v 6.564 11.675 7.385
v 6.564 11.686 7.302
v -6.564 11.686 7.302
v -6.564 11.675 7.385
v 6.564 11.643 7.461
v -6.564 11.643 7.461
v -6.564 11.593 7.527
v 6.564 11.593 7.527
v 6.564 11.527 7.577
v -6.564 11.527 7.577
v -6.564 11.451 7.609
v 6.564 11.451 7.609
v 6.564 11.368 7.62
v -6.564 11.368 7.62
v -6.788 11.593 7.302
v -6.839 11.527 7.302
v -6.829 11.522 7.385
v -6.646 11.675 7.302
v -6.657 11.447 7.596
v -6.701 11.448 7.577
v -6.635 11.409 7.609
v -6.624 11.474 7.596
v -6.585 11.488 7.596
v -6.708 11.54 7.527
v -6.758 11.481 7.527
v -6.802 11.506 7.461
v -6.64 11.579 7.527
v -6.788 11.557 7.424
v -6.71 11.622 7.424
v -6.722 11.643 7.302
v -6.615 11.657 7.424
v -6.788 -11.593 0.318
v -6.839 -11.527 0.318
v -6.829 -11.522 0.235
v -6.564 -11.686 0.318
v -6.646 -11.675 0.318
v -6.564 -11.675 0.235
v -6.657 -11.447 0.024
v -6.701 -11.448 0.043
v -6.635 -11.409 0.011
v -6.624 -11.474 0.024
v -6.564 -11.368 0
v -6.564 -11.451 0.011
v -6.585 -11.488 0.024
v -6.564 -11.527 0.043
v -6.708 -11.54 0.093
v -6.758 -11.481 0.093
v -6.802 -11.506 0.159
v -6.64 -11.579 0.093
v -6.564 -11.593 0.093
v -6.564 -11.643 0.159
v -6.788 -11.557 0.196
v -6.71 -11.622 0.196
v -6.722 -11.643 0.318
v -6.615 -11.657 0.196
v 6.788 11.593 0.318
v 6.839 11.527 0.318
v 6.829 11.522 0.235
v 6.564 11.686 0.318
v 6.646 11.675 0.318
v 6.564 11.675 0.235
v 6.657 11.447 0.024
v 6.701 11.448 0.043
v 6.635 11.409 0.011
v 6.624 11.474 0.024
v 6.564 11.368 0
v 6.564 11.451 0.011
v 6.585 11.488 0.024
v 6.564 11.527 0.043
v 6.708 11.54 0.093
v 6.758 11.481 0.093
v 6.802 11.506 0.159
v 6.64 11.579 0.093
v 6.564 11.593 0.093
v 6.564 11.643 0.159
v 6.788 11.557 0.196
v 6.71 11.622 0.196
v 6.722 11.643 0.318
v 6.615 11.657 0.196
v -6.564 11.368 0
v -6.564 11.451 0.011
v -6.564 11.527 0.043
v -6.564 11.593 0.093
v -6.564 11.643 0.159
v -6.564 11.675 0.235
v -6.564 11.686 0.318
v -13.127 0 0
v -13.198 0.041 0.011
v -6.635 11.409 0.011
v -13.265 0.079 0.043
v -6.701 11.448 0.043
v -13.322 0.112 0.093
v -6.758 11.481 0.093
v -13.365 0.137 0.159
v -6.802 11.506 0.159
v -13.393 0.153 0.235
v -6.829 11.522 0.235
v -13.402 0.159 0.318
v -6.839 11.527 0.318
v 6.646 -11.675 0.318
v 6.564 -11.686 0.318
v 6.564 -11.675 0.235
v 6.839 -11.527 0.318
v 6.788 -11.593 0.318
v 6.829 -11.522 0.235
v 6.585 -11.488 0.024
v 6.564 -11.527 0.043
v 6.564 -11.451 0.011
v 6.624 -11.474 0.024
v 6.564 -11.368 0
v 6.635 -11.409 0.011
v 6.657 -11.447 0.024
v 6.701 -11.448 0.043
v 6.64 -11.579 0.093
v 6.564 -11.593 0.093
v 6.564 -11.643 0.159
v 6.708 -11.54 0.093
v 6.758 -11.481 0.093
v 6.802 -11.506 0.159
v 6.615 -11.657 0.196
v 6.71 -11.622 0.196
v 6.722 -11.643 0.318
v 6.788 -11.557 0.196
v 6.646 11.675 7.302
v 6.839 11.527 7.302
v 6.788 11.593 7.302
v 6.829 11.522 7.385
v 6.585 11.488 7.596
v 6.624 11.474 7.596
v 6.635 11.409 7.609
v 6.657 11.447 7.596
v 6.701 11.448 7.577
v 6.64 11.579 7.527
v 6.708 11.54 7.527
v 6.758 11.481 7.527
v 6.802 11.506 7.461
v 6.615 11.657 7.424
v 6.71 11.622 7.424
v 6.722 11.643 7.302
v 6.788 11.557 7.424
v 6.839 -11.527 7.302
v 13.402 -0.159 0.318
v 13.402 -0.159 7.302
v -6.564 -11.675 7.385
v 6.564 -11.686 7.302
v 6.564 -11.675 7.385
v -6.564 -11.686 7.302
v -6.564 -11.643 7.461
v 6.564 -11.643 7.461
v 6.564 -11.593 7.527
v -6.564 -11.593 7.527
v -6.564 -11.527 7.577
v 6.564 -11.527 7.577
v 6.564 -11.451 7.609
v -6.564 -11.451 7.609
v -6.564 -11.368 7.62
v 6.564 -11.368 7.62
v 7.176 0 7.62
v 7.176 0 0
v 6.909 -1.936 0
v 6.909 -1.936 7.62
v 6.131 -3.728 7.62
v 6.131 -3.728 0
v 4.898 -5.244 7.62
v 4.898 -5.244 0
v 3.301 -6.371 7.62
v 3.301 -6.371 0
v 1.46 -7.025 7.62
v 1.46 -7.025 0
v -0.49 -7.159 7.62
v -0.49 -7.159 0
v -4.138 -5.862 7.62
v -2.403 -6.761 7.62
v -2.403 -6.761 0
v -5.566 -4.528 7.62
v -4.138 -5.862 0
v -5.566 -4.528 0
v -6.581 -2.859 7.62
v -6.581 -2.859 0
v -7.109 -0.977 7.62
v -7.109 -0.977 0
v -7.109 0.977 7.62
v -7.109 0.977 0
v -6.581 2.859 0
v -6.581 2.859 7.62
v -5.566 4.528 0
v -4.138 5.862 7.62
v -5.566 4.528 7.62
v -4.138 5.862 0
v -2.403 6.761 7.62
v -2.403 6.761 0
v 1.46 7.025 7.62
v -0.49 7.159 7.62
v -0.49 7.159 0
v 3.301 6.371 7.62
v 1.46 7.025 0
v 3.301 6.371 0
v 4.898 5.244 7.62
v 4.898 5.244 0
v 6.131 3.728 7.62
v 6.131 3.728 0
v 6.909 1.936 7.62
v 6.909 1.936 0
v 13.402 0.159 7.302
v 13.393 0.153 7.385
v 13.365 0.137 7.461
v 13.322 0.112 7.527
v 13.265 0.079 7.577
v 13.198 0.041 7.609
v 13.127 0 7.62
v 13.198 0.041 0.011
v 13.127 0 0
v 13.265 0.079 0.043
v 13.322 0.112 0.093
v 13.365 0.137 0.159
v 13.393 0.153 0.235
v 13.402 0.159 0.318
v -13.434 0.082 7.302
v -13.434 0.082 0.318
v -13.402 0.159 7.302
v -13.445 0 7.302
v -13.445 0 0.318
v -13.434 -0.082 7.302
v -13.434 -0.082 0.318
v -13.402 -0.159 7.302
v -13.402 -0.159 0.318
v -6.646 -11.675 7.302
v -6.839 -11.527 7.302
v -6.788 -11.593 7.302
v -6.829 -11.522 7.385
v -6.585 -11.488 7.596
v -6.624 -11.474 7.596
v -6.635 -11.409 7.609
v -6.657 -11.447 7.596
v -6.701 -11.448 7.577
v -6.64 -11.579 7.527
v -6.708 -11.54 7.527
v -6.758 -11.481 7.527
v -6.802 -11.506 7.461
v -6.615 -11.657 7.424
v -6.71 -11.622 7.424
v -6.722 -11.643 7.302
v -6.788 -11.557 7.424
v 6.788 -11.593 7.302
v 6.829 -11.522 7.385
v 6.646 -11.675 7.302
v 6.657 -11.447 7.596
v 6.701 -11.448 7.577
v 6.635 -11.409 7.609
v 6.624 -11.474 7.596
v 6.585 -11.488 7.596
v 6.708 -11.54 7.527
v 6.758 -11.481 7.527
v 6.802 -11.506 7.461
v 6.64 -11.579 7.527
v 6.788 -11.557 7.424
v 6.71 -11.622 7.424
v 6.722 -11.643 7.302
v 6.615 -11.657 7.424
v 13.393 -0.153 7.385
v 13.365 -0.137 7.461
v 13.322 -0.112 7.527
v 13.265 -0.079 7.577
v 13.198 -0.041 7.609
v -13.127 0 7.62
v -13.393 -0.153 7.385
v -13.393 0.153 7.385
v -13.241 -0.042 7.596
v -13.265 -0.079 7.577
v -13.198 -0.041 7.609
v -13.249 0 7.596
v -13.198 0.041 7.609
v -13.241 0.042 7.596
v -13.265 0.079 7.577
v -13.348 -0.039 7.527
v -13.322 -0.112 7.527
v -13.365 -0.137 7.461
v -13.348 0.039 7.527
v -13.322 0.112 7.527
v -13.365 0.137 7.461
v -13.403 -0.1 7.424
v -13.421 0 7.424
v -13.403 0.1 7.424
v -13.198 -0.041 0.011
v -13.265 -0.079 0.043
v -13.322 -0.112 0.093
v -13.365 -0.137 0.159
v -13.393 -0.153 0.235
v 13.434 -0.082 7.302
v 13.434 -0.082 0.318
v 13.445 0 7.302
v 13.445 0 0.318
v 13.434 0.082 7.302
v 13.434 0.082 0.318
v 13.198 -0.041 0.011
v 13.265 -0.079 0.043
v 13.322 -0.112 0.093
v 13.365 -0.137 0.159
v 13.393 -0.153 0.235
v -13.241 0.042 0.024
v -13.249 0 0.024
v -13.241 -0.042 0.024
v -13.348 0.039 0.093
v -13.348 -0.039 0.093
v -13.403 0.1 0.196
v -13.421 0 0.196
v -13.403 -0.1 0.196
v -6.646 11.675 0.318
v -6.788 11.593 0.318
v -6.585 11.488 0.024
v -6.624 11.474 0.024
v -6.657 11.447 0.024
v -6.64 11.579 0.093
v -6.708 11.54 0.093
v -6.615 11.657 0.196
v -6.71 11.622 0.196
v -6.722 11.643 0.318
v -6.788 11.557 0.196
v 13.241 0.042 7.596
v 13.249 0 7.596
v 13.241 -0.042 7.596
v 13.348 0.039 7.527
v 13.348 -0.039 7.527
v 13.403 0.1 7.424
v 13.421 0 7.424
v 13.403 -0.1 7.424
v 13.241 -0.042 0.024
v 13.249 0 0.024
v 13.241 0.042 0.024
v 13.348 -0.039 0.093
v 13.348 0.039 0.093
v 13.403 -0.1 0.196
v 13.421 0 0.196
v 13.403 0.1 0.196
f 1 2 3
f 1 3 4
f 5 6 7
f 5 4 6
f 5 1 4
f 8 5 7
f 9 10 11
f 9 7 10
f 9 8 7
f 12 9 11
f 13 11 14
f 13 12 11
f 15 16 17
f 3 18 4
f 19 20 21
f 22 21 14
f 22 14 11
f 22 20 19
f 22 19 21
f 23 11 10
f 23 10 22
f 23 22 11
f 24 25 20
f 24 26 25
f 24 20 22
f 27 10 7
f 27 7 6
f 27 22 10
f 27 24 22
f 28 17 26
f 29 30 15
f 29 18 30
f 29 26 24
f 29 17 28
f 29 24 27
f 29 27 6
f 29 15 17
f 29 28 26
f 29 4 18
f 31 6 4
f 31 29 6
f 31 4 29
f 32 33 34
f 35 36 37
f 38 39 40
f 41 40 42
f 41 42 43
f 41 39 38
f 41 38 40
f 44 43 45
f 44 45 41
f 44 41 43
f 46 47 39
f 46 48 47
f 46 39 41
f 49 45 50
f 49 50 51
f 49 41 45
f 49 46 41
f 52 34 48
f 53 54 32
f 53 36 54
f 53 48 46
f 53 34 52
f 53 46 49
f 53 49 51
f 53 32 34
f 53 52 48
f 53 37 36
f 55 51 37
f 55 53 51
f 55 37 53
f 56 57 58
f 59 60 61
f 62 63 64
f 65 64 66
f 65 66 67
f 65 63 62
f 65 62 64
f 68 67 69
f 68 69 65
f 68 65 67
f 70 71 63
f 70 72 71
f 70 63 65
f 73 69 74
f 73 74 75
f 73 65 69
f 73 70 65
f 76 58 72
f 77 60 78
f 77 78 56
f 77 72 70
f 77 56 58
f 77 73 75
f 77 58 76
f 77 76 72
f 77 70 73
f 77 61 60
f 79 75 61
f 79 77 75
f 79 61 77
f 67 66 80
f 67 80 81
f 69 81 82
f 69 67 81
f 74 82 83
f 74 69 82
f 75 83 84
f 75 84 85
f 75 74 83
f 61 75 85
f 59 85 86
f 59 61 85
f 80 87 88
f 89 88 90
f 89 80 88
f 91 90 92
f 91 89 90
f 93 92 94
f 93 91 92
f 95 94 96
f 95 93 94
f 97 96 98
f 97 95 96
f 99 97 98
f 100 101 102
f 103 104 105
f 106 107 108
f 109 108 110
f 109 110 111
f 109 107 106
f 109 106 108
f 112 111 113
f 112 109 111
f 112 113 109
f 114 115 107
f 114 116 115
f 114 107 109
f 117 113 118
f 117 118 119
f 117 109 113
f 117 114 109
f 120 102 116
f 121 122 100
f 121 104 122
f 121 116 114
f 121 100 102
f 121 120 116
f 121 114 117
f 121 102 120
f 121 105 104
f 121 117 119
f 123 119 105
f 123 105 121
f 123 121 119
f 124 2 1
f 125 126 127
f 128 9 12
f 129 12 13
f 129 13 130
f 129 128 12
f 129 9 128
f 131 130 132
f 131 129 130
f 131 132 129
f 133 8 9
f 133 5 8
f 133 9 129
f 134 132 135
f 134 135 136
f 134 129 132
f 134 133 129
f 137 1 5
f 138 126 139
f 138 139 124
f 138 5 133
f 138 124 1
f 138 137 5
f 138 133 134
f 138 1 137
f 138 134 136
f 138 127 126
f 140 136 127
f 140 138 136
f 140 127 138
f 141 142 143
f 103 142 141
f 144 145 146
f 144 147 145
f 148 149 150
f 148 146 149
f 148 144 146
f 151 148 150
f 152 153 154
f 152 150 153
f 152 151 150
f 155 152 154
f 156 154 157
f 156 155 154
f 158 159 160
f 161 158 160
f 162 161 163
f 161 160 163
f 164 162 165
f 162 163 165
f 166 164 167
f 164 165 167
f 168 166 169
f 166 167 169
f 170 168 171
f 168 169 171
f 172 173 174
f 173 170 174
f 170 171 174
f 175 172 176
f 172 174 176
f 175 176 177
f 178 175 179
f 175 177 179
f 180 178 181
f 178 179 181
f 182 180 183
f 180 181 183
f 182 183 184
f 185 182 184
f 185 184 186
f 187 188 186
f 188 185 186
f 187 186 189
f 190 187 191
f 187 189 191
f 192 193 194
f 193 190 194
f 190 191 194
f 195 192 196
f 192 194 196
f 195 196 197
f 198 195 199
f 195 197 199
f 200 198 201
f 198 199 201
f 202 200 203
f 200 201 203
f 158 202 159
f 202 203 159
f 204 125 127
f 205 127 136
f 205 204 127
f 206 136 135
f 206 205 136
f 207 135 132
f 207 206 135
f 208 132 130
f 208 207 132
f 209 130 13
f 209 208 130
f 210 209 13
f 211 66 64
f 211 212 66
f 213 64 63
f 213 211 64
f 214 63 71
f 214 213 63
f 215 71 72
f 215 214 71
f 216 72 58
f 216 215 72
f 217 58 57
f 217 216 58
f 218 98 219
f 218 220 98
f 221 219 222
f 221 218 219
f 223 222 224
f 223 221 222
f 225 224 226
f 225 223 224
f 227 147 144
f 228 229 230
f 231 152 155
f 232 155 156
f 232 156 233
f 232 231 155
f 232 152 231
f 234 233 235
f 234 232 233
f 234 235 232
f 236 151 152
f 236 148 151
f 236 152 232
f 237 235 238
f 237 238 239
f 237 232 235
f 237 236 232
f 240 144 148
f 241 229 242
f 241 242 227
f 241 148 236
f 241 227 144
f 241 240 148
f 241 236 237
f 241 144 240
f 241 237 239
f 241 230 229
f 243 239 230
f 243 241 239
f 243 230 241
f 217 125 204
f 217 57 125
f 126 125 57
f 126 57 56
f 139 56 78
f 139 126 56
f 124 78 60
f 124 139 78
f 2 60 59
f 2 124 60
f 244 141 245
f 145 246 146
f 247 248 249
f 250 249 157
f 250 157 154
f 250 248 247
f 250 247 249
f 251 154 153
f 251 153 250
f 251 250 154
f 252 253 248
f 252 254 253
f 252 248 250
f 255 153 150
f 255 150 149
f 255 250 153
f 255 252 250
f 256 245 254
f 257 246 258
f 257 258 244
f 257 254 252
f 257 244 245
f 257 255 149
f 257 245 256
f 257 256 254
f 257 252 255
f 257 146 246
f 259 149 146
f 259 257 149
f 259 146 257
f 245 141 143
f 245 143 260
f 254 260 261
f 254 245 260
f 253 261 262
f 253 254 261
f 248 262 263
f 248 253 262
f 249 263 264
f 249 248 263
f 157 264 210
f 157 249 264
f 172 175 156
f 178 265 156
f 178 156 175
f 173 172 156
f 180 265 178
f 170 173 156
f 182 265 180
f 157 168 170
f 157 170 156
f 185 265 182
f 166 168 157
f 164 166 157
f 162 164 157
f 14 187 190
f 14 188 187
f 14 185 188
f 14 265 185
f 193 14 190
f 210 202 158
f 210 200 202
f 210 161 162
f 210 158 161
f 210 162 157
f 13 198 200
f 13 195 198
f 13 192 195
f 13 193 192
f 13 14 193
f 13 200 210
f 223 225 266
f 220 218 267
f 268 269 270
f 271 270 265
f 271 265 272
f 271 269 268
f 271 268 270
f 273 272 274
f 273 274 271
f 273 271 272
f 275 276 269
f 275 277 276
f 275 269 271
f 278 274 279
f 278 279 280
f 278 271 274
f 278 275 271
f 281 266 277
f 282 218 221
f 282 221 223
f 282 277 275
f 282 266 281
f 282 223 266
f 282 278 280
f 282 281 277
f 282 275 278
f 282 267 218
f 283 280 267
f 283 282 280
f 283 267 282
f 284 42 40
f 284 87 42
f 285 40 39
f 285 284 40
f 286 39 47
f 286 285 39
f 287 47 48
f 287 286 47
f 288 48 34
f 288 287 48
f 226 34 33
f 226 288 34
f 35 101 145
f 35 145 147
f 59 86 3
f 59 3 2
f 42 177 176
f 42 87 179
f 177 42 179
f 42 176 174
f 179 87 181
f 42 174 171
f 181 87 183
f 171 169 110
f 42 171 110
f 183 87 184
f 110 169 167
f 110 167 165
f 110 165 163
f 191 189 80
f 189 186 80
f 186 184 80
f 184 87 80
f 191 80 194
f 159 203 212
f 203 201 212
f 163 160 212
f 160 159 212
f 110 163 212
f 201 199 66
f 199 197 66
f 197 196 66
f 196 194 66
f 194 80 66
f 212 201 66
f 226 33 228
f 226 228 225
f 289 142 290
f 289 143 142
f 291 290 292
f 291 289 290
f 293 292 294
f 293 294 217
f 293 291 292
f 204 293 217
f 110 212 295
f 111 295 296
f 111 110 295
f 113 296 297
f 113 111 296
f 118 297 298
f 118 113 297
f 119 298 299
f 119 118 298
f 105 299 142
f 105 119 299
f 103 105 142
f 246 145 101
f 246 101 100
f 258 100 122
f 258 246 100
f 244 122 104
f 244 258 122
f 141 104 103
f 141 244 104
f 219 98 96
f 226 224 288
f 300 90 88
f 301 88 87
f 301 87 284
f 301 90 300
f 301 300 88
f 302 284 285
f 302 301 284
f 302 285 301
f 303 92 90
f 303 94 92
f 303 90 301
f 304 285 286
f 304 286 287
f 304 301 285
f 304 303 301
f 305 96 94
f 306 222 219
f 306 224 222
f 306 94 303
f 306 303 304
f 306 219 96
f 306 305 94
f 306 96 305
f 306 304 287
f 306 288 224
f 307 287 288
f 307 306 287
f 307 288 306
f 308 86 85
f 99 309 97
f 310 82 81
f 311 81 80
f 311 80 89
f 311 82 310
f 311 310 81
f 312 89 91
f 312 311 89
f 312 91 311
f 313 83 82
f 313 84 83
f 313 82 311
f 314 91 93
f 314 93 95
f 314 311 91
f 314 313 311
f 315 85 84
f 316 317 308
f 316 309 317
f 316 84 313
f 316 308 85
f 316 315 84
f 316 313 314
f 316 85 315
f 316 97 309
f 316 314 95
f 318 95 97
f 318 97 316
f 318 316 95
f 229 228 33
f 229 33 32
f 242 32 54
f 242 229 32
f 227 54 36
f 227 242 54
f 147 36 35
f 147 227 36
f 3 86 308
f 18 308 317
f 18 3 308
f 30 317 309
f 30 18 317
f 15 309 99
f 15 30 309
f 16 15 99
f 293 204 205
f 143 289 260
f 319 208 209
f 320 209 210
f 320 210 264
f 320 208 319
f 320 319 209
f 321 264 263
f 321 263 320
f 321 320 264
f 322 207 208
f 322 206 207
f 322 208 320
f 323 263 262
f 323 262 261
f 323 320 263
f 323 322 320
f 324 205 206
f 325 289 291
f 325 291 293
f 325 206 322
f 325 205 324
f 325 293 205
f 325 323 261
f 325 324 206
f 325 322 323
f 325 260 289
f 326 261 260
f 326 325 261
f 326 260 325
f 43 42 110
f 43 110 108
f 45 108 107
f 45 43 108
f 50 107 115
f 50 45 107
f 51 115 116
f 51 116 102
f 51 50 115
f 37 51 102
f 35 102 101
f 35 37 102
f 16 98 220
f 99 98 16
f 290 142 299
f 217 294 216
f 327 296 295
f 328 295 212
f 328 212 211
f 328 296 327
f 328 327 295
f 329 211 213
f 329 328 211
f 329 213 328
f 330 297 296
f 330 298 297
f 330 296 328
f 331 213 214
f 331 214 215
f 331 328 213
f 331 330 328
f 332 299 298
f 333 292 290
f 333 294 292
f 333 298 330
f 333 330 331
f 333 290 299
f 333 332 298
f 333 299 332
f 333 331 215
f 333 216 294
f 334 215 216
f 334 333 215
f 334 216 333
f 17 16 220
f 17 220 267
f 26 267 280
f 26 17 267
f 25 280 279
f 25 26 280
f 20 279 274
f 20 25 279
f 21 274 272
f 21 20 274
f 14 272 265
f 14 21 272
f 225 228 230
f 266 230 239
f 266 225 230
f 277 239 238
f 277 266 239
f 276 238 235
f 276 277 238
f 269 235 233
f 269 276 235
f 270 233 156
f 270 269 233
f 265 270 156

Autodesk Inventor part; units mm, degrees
ref_plane "YZ Plane" through (0, 0, 0) normal (1, 0, 0) x (0, 1, 0)
ref_plane "XZ Plane" through (0, 0, 0) normal (0, 1, 0) x (-1, 0, 0)
ref_plane "XY Plane" through (0, 0, 0) normal (0, 0, 1) x (1, 0, 0)
sketch "Sketch1" plane through (0, 0, 0) normal (0, 0, 1) x (1, 0, 0)
  line L0 (13.4938, 0) -> (6.7469, -11.6859)
  line L1 (6.7469, -11.6859) -> (-6.7469, -11.6859)
  line L2 (-6.7469, -11.6859) -> (-13.4938, 0)
  line L3 (-13.4938, 0) -> (-6.7469, 11.6859)
  line L4 (-6.7469, 11.6859) -> (6.7469, 11.6859)
  line L5 (6.7469, 11.6859) -> (13.4938, 0)
  circle A0 centre (0, 0) radius 7.1755
  point P0 (0, 0)
  point P1 (0, 0)
  dimension "d0" = 26.9875
  dimension "d1" = 14.351
extrude "Extrusion1" add sketch "Sketch1" along normal blind 7.62
fillet "Fillet1" radius 0.3175 18 edges at (0, 11.6859, 7.62) (6.7469, 11.6859, 3.81) (-6.7469, 11.6859, 3.81) (0, 11.6859, 0) (10.1203, 5.843, 7.62) (10.1203, 5.843, 0) (13.4938, 0, 3.81) (10.1203, -5.843, 0) (10.1203, -5.843, 7.62) (6.7469, -11.6859, 3.81) (0, -11.6859, 7.62) (0, -11.6859, 0) (-6.7469, -11.6859, 3.81) (-10.1203, -5.843, 0) (-10.1203, -5.843, 7.62) (-13.4938, 0, 3.81) (-10.1203, 5.843, 7.62) (-10.1203, 5.843, 0)
thread "Thread1" size "5/8-11 UNC" class "2B" standard "ANSI Unified Screw Threads" full length
properties part number "Large Nut" material "Stainless Steel"
